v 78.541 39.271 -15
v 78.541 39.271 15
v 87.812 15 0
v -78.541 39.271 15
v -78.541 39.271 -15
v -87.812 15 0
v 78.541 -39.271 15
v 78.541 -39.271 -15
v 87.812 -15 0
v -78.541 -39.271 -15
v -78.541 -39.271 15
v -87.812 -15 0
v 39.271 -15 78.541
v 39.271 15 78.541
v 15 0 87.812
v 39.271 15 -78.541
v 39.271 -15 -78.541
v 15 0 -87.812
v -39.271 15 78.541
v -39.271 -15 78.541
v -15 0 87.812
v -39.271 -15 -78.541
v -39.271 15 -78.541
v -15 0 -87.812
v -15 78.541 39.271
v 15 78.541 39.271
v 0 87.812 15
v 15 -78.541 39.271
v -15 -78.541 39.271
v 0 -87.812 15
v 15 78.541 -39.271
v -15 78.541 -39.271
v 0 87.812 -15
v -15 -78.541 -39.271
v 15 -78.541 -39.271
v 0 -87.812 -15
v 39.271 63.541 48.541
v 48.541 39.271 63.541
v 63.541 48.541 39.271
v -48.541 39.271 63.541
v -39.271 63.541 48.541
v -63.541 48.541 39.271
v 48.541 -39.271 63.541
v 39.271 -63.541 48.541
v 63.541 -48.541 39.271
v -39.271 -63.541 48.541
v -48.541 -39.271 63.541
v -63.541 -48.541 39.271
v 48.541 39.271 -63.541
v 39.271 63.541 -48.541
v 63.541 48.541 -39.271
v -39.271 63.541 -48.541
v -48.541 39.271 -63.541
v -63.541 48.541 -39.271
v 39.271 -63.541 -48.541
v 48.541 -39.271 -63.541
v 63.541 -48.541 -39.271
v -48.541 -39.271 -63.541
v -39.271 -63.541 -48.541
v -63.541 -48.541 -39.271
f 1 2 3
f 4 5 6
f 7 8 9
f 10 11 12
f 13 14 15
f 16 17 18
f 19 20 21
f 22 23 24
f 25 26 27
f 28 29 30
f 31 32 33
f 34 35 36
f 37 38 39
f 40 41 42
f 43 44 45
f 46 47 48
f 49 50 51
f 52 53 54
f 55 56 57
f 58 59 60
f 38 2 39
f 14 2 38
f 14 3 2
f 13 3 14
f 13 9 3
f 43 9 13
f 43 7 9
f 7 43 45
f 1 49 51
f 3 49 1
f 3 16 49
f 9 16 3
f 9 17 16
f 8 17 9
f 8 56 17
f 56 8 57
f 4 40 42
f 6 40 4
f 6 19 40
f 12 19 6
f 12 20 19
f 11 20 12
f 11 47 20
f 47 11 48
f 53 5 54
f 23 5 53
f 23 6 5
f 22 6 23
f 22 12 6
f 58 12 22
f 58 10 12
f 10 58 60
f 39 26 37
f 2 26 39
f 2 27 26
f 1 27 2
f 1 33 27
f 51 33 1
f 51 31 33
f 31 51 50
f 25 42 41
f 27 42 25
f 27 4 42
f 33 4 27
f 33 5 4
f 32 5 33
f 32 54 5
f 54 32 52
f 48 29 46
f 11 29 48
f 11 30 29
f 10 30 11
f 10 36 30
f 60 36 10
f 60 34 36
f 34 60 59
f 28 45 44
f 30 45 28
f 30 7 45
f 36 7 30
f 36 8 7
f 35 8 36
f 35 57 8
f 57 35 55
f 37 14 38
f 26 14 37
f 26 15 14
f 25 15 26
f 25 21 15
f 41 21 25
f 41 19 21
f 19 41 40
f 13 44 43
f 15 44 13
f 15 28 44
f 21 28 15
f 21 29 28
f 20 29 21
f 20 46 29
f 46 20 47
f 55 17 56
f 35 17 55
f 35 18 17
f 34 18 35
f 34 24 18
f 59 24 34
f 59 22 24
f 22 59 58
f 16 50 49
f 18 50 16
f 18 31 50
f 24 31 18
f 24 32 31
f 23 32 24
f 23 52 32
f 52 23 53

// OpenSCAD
// Truncated Dodecahedron
// (C) @oblomobka - 2023.06
// GPL license

/* **CUSTOMIZER VARIABLES** */
// Edge
edge = 30; // [10:100]
// Center of the solid or stand over a face
position = "Center"; // ["Center", "Face"]

/* **MODULES** */   
module TruncatedDodecahedron(edge=20, position="Face"){  // tD
    // Constants
    phi = (1+sqrt(5))/2; // Golden ratio = 1,618...
    
    // Invariants
    diAngleDodecahedron = acos(-1/sqrt(5)); // dihedral angle of Dodecahedron = 116,56505...
    
    // Relations
    rInsDecagon = (sqrt((25 +11*sqrt(5))/2))/2;
    
    // Variables
    s = edge * (phi / 2); // * (2 / phi);
    // define 3 rectangles on plane XY/XZ/YZ
    p1 = (2 + phi) * s;
    p2 = (1 / phi) * s;
    // define 3 boxes. Every point in one octant
    b1 = (2 * phi) * s;
    b2 = (1 * phi) * s;
    b3 = (1 / phi) * s;
    // define 8 triangles. One triangle per octant
    t1 = (phi + 1) * s;
    t2 = 2 * s;
    t3 = (1 * phi) * s;
    
    
    // Definition of points and faces V = 60 / F = 32 ( 20 triangles + 12 decagons )
    Dpoints = [
    
        // Build 3 rectangles on plane XY/XZ/YZ
        [+p1, +p2,   0], [-p1, +p2,   0], [+p1, -p2,   0], [-p1, -p2,   0],    // XY    [  0 -  3]
        [+p2,   0, +p1], [+p2,   0, -p1], [-p2,   0, +p1], [-p2,   0, -p1],    // XZ    [  4 -  7]
        [0,   +p1, +p2], [0,   -p1, +p2], [0,   +p1, -p2], [0,   -p1, -p2],    // XZ    [  8 - 11]
        
        // build 3 boxes. Every point in one octant
        [+b1, +b2, +b3], [-b1, +b2, +b3], [+b1, -b2, +b3], [-b1, -b2, +b3],    // XYZ order by size - UP side       [ 12 - 15]
        [+b1, +b2, -b3], [-b1, +b2, -b3], [+b1, -b2, -b3], [-b1, -b2, -b3],    // XYZ order by size - DOWN side     [ 16 - 19]
        
        [+b2, +b3, +b1], [+b2, +b3, -b1], [-b2, +b3, +b1], [-b2, +b3, -b1],    // YZX order by size - UP side       [ 20 - 23]
        [+b2, -b3, +b1], [+b2, -b3, -b1], [-b2, -b3, +b1], [-b2, -b3, -b1],,    // YZX order by size - Down side    [ 24 - 27]
        
        [+b3, +b1, +b2], [+b3, -b1, +b2], [+b3, +b1, -b2], [+b3, -b1, -b2],    // ZXY order by size - UP side       [ 28 - 31]
        [-b3, +b1, +b2], [-b3, -b1, +b2], [-b3, +b1, -b2], [-b3, -b1, -b2],    // ZXY order by size - DOWN side     [ 32 - 35]
        
        // Build 8 triangles. One triangle per octant
        [+t1, +t2, +t3], [-t1, +t2, +t3], [+t1, -t2, +t3], [-t1, -t2, +t3],    //   36  37  38  39
        [+t1, +t2, -t3], [-t1, +t2, -t3], [+t1, -t2, -t3], [-t1, -t2, -t3],    //   40  41  42  43    
        
        [+t2, +t3, +t1], [+t2, +t3, -t1], [-t2, +t3, +t1], [-t2, +t3, -t1],    //   44  45  46  47
        [+t2, -t3, +t1], [+t2, -t3, -t1], [-t2, -t3, +t1], [-t2, -t3, -t1],    //   48  49  50  51  
        
        [+t3, +t1, +t2], [+t3, -t1, +t2], [+t3, +t1, -t2], [+t3, -t1, -t2],    //   52  53  54  55  
        [-t3, +t1, +t2], [-t3, -t1, +t2], [-t3, +t1, -t2], [-t3, -t1, -t2]     //   56  57  58  59  
        
        ];
         
    Dfaces = [
    
        // Triangles on planes
        [  0, 12, 16], [  1, 17, 13], [  2, 18, 14], [  3, 15, 19],        // XY
        [  4, 20, 24], [  5, 25, 21], [  6, 26, 22], [  7, 23, 27],        // XZ
        [  8, 28, 32], [  9, 33, 29], [ 10, 34, 30], [ 11, 31, 35],        // YZ
        
        // Triangles on corners
        [ 36, 44, 52], [ 37, 56, 46], [ 38, 53, 48], [ 39, 50, 57],        // UP    - A/B/C/D
        [ 40, 54, 45], [ 41, 47, 58], [ 42, 49, 55], [ 43, 59, 51],        // DOWN  - E/F/G/H
        
        // Decagons
        [  2, 14, 38, 48, 24, 20, 44, 36, 12,  0], [ 16, 40, 45, 21, 25, 49, 42, 18,  2,  0],   // +X
        [ 13, 37, 46, 22, 26, 50, 39, 15,  3,  1], [  3, 19, 43, 51, 27, 23, 47, 41, 17,  1],   // -X
        [ 10, 30, 54, 40, 16, 12, 36, 52, 28,  8], [ 32, 56, 37, 13, 17, 41, 58, 34, 10,  8],   // +Y
        [ 11, 35, 59, 43, 19, 15, 39, 57, 33,  9], [ 29, 53, 38, 14, 18, 42, 55, 31, 11,  9],   // -Y
        [  6, 22, 46, 56, 32, 28, 52, 44, 20,  4], [ 24, 48, 53, 29, 33, 57, 50, 26,  6,  4],   // +Z
        [  7, 27, 51, 59, 35, 31, 55, 49, 25,  5], [ 21, 45, 54, 30, 34, 58, 47, 23,  7,  5]    // -Z


        ];
    
    // Polyhedron stands on xy plane centered on the center of the face or centered on the center of polyhedron
    if(position=="Face"){
        translate([0,0,edge*rInsDecagon])
            rotate([90-diAngleDodecahedron/2, 0, 0])
                polyhedron(Dpoints,Dfaces);
        }
        
    else if(position=="Center") {
        polyhedron(Dpoints,Dfaces);        
        } 
}

/* **RENDERING OF SOLIDS** */
TruncatedDodecahedron ( edge = edge, position = position);
    
